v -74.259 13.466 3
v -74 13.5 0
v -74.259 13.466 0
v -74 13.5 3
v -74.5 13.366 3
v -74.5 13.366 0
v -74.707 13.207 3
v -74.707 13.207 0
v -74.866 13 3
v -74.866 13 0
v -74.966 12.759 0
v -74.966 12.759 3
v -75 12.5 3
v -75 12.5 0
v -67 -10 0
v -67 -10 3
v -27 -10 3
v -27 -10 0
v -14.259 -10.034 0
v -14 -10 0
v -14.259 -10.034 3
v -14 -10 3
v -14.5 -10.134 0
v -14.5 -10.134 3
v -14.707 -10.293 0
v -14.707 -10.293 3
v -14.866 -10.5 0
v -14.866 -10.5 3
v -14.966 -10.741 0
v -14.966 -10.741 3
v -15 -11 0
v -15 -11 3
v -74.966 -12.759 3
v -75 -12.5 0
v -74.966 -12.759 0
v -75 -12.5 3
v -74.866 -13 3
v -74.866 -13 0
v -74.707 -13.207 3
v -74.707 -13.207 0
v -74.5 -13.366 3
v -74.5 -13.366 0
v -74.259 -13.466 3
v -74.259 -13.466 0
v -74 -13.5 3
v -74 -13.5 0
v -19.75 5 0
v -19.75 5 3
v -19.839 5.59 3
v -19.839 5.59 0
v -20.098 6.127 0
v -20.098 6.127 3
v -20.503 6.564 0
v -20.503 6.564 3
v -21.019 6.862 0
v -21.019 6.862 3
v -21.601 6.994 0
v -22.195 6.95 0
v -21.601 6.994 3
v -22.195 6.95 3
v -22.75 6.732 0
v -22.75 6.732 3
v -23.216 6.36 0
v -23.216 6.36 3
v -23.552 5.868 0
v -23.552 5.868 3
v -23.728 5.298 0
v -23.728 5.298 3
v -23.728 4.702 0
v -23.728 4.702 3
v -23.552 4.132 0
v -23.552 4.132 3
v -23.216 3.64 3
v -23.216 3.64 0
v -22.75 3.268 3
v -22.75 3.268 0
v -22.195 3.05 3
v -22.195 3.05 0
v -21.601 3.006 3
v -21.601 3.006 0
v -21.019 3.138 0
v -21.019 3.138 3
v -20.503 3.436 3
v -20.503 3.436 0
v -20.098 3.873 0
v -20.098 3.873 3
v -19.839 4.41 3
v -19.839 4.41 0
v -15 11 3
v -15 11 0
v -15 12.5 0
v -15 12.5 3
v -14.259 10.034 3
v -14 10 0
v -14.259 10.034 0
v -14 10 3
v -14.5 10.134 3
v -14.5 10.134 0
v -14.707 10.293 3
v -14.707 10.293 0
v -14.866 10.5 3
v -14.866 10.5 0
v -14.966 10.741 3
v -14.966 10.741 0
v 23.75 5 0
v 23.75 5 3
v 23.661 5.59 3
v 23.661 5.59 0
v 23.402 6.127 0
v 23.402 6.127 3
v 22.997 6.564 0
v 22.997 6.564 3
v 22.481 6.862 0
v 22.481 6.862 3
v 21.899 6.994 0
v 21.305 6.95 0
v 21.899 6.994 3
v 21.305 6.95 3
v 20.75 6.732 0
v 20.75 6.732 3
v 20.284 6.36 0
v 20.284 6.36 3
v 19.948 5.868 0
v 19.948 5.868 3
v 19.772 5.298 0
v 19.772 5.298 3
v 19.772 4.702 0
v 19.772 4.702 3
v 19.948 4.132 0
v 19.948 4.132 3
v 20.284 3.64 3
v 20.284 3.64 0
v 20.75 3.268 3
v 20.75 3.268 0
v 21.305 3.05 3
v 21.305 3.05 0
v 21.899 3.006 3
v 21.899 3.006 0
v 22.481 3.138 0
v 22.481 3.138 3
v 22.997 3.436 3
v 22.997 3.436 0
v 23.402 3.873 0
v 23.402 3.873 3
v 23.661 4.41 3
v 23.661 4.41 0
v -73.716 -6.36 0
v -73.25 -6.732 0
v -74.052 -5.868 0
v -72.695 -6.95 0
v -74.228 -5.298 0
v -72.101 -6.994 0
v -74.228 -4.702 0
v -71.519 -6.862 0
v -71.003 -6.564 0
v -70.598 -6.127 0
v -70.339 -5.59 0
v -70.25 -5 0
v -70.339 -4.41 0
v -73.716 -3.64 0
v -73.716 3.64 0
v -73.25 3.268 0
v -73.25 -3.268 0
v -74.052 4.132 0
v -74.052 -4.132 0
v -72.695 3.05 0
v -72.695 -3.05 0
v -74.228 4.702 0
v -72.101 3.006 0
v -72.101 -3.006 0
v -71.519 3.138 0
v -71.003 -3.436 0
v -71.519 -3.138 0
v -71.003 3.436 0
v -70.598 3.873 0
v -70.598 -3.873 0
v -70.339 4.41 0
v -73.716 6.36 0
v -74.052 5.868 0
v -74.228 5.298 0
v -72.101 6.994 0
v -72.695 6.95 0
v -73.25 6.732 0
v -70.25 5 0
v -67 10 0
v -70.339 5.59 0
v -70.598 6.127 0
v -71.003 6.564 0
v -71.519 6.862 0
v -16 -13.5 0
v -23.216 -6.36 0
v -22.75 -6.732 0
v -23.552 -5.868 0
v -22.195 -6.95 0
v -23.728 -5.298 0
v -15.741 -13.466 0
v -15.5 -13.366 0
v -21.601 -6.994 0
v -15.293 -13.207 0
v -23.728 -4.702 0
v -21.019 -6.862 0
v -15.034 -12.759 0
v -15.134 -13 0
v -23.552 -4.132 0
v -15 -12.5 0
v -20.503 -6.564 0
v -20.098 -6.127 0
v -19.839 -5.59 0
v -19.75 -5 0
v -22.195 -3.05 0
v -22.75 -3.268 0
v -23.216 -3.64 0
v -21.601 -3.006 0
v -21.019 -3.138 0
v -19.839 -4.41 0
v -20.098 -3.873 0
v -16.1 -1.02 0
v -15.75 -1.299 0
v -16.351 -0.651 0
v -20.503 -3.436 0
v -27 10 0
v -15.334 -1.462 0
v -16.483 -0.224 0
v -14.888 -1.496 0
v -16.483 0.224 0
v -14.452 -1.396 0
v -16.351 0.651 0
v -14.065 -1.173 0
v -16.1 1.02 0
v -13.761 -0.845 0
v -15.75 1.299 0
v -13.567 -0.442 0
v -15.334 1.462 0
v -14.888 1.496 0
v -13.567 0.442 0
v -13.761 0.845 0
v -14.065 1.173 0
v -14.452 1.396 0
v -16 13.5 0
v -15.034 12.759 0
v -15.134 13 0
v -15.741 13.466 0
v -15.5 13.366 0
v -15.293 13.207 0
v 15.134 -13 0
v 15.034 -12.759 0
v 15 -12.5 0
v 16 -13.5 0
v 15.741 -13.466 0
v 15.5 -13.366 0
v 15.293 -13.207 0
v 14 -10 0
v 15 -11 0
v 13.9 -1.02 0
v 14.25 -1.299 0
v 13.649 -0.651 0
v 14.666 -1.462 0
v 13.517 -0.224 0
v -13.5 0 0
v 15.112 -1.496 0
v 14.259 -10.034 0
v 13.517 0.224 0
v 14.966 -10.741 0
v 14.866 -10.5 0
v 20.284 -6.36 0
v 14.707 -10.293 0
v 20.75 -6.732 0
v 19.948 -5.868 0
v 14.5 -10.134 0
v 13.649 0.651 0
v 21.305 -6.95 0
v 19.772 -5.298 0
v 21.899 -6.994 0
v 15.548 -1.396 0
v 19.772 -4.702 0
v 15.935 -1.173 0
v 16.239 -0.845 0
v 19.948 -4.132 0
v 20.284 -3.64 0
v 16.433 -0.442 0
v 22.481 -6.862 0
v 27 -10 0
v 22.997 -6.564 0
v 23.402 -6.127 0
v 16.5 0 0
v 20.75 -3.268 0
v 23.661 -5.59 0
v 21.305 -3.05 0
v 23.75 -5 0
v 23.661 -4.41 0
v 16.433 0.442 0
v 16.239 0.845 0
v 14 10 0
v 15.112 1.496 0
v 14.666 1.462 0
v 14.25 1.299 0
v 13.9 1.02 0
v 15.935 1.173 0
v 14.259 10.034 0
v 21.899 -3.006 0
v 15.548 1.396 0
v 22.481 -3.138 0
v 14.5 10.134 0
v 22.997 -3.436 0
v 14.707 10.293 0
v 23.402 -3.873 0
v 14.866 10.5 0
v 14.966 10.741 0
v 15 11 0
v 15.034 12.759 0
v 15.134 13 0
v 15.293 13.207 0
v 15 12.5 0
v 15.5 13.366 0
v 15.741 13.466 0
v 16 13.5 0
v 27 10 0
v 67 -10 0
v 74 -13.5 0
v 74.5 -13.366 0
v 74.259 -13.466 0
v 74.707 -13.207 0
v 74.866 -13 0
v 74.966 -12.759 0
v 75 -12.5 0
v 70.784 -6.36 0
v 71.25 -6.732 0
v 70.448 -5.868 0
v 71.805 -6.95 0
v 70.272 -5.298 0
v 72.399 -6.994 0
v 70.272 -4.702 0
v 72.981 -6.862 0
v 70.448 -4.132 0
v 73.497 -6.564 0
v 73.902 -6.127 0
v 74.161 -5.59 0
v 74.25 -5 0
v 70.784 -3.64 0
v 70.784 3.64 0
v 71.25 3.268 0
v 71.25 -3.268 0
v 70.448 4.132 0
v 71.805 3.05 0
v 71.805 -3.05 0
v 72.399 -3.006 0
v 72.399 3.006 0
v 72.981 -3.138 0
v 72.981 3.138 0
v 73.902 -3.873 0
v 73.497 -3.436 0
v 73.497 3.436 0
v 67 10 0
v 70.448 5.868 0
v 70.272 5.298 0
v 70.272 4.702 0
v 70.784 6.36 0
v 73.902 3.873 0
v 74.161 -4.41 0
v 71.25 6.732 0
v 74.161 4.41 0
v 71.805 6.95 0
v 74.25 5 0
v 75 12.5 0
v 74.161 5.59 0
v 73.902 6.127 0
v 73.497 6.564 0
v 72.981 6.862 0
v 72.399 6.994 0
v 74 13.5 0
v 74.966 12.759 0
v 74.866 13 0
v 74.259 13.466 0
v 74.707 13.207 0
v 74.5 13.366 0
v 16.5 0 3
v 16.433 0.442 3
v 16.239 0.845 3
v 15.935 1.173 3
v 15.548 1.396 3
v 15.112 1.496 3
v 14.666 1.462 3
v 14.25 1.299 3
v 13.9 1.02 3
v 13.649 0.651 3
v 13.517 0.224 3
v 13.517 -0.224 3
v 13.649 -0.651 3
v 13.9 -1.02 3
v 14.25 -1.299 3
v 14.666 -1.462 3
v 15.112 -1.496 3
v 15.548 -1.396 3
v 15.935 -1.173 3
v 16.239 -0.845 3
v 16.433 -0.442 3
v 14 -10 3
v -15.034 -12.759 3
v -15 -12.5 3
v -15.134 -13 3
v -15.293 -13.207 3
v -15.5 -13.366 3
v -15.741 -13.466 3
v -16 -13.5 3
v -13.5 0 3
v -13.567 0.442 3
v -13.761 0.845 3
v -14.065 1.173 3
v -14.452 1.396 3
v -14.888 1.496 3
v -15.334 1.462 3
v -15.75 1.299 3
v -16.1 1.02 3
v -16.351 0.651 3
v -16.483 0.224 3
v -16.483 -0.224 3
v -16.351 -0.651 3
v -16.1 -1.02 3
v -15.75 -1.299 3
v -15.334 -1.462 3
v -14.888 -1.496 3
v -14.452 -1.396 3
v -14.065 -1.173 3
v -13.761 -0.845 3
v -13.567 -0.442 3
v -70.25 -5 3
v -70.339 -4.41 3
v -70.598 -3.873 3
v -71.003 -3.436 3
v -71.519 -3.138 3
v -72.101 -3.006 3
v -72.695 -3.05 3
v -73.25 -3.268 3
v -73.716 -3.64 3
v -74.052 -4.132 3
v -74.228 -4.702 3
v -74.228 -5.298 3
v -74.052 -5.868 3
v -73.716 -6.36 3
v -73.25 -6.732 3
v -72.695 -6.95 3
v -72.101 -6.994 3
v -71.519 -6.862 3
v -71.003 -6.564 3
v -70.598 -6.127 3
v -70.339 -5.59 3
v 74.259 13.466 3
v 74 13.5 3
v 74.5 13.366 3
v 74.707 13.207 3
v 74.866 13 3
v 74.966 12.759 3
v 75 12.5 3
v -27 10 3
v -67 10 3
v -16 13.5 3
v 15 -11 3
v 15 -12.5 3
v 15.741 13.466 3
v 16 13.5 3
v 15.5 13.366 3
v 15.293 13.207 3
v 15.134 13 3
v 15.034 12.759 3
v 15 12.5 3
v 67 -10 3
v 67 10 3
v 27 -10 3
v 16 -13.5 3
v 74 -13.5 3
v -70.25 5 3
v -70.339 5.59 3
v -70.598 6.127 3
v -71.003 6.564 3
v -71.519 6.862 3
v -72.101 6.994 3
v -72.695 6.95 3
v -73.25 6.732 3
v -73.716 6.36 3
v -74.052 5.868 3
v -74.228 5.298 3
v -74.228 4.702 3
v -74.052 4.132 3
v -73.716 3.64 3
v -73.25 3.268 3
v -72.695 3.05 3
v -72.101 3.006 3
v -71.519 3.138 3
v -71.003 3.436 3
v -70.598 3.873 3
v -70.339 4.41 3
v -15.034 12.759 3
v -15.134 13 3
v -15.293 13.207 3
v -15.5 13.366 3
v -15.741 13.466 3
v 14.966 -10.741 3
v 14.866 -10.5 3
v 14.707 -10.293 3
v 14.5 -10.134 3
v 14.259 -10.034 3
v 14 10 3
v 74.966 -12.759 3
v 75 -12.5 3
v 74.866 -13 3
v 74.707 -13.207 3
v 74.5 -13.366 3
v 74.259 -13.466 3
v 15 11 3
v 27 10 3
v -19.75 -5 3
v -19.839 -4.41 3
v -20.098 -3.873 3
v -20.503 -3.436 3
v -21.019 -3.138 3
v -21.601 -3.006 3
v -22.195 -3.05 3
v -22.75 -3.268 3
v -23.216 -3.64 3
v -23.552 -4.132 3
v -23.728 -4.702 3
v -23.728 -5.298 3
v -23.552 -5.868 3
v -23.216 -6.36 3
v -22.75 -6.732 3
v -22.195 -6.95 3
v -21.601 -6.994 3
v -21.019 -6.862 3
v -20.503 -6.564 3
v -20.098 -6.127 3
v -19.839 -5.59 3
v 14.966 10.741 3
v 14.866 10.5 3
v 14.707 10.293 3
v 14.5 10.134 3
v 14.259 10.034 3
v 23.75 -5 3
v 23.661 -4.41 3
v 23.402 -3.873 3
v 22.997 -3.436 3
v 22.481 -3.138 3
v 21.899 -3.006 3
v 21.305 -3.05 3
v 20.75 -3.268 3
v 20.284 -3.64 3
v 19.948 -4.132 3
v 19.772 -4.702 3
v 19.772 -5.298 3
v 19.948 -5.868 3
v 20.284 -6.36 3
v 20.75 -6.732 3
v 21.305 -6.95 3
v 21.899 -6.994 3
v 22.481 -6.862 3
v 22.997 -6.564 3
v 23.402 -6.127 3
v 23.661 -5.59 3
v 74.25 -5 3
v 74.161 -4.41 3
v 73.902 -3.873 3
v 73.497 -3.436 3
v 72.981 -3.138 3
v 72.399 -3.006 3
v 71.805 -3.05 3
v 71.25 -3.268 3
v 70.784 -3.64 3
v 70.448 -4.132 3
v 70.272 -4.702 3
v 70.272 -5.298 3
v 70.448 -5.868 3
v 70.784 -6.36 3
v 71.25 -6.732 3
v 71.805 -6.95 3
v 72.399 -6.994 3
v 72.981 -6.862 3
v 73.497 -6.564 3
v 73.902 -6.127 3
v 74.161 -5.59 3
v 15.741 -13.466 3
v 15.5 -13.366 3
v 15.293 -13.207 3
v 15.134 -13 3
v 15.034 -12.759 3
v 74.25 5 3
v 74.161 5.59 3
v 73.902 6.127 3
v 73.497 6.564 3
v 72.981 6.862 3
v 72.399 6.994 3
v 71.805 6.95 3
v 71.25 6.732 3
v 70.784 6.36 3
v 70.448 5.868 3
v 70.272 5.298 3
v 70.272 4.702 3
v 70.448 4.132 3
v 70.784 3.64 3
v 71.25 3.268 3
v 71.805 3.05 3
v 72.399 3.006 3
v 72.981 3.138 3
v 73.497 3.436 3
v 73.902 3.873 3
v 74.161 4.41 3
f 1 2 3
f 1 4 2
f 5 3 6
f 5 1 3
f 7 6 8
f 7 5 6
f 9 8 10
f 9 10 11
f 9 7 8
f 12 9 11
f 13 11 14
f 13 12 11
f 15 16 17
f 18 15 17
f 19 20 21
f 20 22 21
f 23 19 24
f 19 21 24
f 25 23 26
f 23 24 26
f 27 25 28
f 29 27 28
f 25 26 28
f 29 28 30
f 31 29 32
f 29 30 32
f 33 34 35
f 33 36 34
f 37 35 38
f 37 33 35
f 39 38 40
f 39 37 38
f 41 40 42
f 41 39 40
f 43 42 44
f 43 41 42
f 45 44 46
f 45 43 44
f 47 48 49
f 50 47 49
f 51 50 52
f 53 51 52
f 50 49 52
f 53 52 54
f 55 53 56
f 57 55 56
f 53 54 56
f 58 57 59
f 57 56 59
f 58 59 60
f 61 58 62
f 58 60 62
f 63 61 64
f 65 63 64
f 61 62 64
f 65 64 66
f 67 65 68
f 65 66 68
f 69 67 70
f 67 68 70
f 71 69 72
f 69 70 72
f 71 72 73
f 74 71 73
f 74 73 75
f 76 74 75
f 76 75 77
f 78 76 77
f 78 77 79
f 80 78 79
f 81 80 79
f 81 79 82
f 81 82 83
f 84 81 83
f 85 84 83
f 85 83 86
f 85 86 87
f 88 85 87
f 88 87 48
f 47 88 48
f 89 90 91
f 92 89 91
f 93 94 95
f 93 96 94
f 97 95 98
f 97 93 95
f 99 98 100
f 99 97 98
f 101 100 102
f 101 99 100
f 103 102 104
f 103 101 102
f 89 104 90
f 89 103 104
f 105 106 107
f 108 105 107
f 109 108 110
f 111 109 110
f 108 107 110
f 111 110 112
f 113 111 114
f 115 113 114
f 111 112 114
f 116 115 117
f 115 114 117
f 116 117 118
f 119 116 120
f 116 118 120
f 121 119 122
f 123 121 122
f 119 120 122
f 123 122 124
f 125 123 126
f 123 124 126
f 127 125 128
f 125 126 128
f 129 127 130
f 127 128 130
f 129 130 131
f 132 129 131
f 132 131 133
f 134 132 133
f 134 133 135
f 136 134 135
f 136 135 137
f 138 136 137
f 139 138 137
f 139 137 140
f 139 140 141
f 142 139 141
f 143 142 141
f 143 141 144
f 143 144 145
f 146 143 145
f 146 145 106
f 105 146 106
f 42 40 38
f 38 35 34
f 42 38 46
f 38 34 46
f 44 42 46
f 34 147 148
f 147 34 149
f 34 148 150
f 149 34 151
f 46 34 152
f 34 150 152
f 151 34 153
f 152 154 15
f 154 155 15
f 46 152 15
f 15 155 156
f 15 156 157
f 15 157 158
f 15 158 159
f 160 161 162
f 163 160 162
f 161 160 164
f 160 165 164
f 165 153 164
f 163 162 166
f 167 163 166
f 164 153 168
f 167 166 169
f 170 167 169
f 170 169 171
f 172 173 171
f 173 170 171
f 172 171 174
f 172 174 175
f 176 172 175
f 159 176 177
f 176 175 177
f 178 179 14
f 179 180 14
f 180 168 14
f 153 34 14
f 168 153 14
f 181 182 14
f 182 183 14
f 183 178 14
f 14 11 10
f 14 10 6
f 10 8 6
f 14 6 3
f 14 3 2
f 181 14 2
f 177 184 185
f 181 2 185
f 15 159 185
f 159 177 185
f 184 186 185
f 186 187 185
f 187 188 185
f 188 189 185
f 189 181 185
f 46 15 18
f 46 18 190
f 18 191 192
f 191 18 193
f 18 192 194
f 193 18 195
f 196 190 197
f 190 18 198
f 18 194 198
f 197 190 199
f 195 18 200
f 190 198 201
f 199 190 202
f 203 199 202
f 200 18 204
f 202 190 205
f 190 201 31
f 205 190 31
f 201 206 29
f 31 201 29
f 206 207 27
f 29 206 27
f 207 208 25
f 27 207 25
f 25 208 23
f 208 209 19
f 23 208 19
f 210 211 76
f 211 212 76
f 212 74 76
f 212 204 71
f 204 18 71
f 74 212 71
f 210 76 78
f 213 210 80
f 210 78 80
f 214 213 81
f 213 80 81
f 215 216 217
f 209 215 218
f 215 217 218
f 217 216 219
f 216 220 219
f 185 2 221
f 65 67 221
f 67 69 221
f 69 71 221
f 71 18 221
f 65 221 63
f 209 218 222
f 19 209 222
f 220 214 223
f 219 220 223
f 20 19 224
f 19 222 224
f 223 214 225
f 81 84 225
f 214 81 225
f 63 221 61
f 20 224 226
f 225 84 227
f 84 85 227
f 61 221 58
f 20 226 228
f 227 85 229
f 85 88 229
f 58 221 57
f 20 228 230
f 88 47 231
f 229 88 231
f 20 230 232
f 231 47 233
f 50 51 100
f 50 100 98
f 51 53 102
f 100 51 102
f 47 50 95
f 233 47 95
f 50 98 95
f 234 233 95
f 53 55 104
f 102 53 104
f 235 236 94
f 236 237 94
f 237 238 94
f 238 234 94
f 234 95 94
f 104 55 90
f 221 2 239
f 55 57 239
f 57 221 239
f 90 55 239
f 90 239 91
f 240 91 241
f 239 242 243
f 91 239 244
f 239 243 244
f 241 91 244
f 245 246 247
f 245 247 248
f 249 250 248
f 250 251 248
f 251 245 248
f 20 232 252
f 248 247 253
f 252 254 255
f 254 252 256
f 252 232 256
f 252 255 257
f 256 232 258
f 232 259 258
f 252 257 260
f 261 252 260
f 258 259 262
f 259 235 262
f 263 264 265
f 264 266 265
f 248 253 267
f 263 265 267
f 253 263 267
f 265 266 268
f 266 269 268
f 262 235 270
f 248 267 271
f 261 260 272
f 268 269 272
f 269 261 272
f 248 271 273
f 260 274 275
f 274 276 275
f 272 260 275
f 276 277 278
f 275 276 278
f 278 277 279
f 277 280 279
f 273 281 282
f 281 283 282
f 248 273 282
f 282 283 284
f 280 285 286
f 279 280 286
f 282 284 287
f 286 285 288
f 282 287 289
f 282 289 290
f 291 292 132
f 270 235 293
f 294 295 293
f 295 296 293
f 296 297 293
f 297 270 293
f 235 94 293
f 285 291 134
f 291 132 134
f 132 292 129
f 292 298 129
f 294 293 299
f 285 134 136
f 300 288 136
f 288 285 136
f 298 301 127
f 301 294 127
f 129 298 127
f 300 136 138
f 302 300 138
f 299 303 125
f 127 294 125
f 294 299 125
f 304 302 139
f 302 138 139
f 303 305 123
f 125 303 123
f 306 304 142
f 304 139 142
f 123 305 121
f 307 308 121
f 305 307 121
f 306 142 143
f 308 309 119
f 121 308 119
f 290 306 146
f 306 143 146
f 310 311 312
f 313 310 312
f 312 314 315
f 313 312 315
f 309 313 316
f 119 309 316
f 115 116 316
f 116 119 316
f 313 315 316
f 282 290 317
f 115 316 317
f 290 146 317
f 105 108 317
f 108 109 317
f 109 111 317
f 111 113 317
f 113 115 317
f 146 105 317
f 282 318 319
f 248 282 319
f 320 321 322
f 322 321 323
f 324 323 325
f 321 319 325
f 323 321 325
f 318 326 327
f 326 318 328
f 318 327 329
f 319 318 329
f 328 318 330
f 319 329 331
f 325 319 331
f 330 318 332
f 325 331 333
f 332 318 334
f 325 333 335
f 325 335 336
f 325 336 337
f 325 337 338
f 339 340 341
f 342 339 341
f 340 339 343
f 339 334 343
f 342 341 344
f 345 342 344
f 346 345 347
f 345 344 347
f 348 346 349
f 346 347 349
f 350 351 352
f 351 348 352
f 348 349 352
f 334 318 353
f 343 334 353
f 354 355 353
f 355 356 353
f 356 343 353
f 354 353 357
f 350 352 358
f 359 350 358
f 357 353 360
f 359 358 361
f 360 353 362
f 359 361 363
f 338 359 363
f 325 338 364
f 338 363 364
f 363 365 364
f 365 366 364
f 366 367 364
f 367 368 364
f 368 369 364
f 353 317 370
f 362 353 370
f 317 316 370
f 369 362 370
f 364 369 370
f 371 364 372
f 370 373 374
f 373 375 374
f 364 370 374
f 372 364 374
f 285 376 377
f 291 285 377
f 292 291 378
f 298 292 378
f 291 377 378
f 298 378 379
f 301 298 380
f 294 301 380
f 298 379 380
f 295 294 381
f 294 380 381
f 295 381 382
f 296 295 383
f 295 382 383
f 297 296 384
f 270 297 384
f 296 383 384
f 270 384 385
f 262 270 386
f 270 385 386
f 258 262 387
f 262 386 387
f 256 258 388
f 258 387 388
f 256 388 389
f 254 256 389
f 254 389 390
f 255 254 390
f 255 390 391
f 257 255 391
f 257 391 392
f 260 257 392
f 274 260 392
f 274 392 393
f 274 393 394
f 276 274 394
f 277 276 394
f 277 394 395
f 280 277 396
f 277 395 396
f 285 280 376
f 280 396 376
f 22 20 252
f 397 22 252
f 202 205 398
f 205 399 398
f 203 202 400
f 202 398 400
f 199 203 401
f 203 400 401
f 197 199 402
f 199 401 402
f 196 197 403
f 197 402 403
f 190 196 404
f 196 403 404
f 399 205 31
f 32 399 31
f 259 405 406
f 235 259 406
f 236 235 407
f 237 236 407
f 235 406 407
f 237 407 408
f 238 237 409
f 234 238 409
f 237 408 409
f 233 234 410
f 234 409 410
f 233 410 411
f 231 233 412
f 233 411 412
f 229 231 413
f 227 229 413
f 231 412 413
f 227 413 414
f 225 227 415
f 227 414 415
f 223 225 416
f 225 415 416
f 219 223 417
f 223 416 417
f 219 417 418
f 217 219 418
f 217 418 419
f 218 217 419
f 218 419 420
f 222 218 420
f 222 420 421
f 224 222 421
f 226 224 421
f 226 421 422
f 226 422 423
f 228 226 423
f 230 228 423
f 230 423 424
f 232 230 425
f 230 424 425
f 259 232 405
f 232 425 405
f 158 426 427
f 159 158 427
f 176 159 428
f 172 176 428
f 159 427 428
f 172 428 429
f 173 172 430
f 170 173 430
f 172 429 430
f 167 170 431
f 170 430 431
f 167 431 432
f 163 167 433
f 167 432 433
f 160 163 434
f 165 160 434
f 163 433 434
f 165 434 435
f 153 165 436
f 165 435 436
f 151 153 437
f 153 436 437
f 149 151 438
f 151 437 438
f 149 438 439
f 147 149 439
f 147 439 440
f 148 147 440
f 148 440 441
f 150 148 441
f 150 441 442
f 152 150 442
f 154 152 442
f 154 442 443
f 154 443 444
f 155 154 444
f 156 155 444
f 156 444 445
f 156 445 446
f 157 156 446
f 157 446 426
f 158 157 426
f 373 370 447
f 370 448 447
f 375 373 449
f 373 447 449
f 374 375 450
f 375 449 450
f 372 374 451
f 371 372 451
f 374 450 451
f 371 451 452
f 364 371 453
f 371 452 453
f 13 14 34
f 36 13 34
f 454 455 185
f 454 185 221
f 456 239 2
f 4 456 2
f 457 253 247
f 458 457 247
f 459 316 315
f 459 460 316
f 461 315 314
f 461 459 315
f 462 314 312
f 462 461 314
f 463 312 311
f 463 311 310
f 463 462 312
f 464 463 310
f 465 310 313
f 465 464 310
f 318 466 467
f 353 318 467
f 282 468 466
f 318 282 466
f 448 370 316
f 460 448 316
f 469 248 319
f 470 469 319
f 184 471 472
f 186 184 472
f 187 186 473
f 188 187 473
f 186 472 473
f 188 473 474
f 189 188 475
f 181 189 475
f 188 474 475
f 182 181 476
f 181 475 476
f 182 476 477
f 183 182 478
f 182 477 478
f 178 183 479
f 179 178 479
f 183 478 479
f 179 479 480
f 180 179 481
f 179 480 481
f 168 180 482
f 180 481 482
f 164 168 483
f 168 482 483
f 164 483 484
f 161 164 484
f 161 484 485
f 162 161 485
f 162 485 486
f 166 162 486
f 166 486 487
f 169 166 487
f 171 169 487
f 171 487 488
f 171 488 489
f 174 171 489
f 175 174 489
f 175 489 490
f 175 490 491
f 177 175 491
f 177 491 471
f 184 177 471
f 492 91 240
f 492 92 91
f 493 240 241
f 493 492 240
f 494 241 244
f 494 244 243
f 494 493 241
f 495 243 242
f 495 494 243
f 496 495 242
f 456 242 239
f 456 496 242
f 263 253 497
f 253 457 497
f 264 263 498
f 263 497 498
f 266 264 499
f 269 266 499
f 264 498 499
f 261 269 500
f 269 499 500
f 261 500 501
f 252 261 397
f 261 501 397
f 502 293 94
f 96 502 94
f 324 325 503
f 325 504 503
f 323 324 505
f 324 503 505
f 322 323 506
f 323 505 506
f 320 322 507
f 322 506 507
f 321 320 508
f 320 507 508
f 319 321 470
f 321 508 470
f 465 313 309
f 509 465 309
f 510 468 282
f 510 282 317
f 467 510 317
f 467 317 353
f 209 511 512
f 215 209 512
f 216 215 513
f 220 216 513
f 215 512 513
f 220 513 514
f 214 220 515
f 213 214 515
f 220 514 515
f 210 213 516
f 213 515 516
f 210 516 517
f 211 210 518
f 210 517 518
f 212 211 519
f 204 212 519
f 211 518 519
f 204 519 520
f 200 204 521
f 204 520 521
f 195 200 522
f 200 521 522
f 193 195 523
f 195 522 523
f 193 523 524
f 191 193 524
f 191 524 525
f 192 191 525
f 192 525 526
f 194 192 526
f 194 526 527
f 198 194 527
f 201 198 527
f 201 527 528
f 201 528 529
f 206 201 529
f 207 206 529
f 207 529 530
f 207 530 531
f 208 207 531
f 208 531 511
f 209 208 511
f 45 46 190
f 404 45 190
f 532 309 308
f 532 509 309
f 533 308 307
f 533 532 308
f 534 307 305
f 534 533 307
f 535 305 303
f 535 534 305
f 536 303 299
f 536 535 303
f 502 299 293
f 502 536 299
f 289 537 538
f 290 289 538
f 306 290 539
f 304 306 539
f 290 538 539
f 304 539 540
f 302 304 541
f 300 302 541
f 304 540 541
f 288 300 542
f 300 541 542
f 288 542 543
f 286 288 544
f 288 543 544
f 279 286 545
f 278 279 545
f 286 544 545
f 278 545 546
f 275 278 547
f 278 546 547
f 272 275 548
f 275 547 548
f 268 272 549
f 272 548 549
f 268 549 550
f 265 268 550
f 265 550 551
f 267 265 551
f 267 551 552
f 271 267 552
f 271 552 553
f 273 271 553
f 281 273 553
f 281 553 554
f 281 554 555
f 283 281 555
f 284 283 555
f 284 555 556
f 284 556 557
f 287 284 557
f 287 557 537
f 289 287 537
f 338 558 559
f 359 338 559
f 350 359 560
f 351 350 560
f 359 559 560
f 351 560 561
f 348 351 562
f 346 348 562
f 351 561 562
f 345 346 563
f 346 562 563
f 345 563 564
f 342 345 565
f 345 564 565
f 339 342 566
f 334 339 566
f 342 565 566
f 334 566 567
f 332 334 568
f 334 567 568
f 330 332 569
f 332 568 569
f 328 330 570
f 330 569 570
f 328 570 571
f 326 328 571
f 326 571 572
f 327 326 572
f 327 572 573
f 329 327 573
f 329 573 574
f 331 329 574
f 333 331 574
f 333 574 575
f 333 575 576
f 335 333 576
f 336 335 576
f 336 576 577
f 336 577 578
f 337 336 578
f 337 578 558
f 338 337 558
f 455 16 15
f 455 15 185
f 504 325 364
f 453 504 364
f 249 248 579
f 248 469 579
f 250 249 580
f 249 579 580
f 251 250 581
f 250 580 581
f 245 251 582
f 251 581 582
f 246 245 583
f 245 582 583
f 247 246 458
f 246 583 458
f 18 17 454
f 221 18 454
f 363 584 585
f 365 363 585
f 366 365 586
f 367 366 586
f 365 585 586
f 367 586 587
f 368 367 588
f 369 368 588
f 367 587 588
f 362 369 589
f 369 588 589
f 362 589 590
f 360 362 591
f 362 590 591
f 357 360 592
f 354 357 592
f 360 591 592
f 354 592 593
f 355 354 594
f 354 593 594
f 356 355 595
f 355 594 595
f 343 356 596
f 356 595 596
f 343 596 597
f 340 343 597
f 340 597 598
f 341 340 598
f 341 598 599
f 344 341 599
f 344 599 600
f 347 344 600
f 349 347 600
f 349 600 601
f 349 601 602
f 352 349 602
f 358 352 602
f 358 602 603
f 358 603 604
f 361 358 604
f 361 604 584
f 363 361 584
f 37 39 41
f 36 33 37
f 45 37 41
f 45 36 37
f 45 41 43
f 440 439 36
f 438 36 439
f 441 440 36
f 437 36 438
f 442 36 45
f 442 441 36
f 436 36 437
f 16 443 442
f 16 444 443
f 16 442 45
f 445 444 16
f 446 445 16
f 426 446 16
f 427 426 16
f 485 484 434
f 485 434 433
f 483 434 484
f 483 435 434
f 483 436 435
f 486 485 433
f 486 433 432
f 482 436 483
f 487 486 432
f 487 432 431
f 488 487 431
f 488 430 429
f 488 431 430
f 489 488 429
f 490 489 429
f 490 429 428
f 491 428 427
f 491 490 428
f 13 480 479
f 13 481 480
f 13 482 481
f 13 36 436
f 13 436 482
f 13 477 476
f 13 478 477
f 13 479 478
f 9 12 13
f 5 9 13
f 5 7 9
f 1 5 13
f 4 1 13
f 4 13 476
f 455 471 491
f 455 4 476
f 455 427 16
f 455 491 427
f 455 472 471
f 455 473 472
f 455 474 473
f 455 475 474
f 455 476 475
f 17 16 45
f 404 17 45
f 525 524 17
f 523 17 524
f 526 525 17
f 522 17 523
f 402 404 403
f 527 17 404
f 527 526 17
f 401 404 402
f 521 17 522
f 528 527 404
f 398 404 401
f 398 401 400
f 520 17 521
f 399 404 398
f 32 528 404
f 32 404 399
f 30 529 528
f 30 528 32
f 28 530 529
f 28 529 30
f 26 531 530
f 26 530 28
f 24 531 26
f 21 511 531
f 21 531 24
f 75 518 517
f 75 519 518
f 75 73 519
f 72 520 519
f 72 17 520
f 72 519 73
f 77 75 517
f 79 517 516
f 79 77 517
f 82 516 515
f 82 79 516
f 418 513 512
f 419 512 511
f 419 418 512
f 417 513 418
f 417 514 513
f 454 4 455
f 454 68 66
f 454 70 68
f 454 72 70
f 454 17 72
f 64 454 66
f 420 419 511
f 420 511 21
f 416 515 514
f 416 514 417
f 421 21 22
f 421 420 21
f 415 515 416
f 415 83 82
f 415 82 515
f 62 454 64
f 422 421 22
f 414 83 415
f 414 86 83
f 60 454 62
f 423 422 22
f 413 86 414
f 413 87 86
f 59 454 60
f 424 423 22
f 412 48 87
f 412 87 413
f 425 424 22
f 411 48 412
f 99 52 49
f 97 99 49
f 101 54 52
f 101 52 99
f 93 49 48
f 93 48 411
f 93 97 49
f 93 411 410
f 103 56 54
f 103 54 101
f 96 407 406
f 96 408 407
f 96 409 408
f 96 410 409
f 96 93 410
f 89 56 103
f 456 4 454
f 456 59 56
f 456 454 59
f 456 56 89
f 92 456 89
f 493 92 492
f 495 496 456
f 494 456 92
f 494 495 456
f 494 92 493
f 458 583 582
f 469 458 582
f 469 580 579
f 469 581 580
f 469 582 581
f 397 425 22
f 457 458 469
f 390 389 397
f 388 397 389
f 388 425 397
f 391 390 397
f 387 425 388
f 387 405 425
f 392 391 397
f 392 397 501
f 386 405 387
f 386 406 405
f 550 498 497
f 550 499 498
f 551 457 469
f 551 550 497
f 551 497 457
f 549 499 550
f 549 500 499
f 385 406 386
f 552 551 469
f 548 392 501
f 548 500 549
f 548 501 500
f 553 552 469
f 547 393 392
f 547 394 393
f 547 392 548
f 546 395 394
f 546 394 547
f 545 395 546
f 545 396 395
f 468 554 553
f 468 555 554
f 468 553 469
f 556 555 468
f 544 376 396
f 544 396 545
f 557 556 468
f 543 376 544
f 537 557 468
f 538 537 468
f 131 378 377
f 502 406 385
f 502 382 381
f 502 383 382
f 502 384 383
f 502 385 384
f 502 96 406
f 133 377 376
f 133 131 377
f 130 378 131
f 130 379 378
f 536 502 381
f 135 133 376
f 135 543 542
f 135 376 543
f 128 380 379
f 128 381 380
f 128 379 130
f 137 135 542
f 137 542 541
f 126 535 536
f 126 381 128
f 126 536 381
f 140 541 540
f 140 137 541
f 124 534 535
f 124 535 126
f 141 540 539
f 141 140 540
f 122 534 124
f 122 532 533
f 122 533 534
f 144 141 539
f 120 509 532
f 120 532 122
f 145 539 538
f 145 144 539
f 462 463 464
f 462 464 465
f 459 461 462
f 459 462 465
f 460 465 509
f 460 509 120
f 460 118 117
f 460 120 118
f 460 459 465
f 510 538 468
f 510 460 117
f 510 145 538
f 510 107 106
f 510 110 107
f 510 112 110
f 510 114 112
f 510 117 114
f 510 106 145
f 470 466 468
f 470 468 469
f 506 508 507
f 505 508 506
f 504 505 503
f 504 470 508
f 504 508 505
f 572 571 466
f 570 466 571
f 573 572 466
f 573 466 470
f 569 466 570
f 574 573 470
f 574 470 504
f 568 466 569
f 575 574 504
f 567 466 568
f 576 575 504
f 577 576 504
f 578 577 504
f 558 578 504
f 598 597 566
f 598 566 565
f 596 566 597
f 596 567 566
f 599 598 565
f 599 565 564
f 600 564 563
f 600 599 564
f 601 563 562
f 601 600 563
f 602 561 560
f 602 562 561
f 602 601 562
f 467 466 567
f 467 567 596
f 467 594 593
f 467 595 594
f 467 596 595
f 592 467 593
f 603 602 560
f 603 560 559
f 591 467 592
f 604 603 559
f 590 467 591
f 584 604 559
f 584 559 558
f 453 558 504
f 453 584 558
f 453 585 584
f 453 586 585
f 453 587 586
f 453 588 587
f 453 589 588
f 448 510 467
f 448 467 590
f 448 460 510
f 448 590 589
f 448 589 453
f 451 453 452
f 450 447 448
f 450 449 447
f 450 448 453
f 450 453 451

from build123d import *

# Parameters (mm, degrees)
SALIENTE_EXTRUIR1_DEPTH = 3
CROQUIS3_R              = 2
CROQUIS3_W              = 40
CROQUIS3_H              = 20
CORTAR_EXTRUIR1_DEPTH   = 4
REDONDEO1_R             = 1
CROQUIS4_R              = 1.5
CORTAR_EXTRUIR2_DEPTH   = 3


with BuildPart() as part:
    # Croquis1 → Saliente-Extruir1 (new body)
    with BuildSketch(Plane.XY):
        Polygon((75, 13.5), (15, 13.5), (15, 10), (-15, 10), (-15, 13.5), (-75, 13.5), (-75, -13.5), (-15, -13.5), (-15, -10), (15, -10), (15, -13.5), (75, -13.5), align=None)
    extrude(amount=SALIENTE_EXTRUIR1_DEPTH)

    # Croquis3 → Cortar-Extruir1 (cut, through all)
    with BuildSketch(Plane.XY.offset(3)):
        with Locations((-21.75, -5)):
            Circle(CROQUIS3_R)
        with Locations((-21.75, 5)):
            Circle(CROQUIS3_R)
        with Locations((-72.25, -5)):
            Circle(CROQUIS3_R)
        with Locations((-72.25, 5)):
            Circle(CROQUIS3_R)
        with Locations((72.25, 5)):
            Circle(CROQUIS3_R)
        with Locations((72.25, -5)):
            Circle(CROQUIS3_R)
        with Locations((21.75, 5)):
            Circle(CROQUIS3_R)
        with Locations((21.75, -5)):
            Circle(CROQUIS3_R)
        with Locations((-47, 0)):
            Rectangle(CROQUIS3_W, CROQUIS3_H)
        with Locations((47, 0)):
            Rectangle(CROQUIS3_W, CROQUIS3_H)
    extrude(amount=-CORTAR_EXTRUIR1_DEPTH, mode=Mode.SUBTRACT)

    # Redondeo1
    redondeo1_edges = [part.edges().sort_by_distance(p)[0] for p in [
        (-75, -13.5, 1.5),
        (-75, 13.5, 1.5),
        (-15, 13.5, 1.5),
        (-15, 10, 1.5),
        (15, 10, 1.5),
        (15, 13.5, 1.5),
        (75, 13.5, 1.5),
        (75, -13.5, 1.5),
        (15, -13.5, 1.5),
        (15, -10, 1.5),
        (-15, -10, 1.5),
        (-15, -13.5, 1.5),
    ]]
    fillet(redondeo1_edges, radius=REDONDEO1_R)

    # Croquis4 → Cortar-Extruir2 (cut)
    with BuildSketch(Plane.XY.offset(3)):
        with Locations((15, 0)):
            Circle(CROQUIS4_R)
        with Locations((-15, 0)):
            Circle(CROQUIS4_R)
    extrude(amount=-CORTAR_EXTRUIR2_DEPTH, mode=Mode.SUBTRACT)


solid = part.part
